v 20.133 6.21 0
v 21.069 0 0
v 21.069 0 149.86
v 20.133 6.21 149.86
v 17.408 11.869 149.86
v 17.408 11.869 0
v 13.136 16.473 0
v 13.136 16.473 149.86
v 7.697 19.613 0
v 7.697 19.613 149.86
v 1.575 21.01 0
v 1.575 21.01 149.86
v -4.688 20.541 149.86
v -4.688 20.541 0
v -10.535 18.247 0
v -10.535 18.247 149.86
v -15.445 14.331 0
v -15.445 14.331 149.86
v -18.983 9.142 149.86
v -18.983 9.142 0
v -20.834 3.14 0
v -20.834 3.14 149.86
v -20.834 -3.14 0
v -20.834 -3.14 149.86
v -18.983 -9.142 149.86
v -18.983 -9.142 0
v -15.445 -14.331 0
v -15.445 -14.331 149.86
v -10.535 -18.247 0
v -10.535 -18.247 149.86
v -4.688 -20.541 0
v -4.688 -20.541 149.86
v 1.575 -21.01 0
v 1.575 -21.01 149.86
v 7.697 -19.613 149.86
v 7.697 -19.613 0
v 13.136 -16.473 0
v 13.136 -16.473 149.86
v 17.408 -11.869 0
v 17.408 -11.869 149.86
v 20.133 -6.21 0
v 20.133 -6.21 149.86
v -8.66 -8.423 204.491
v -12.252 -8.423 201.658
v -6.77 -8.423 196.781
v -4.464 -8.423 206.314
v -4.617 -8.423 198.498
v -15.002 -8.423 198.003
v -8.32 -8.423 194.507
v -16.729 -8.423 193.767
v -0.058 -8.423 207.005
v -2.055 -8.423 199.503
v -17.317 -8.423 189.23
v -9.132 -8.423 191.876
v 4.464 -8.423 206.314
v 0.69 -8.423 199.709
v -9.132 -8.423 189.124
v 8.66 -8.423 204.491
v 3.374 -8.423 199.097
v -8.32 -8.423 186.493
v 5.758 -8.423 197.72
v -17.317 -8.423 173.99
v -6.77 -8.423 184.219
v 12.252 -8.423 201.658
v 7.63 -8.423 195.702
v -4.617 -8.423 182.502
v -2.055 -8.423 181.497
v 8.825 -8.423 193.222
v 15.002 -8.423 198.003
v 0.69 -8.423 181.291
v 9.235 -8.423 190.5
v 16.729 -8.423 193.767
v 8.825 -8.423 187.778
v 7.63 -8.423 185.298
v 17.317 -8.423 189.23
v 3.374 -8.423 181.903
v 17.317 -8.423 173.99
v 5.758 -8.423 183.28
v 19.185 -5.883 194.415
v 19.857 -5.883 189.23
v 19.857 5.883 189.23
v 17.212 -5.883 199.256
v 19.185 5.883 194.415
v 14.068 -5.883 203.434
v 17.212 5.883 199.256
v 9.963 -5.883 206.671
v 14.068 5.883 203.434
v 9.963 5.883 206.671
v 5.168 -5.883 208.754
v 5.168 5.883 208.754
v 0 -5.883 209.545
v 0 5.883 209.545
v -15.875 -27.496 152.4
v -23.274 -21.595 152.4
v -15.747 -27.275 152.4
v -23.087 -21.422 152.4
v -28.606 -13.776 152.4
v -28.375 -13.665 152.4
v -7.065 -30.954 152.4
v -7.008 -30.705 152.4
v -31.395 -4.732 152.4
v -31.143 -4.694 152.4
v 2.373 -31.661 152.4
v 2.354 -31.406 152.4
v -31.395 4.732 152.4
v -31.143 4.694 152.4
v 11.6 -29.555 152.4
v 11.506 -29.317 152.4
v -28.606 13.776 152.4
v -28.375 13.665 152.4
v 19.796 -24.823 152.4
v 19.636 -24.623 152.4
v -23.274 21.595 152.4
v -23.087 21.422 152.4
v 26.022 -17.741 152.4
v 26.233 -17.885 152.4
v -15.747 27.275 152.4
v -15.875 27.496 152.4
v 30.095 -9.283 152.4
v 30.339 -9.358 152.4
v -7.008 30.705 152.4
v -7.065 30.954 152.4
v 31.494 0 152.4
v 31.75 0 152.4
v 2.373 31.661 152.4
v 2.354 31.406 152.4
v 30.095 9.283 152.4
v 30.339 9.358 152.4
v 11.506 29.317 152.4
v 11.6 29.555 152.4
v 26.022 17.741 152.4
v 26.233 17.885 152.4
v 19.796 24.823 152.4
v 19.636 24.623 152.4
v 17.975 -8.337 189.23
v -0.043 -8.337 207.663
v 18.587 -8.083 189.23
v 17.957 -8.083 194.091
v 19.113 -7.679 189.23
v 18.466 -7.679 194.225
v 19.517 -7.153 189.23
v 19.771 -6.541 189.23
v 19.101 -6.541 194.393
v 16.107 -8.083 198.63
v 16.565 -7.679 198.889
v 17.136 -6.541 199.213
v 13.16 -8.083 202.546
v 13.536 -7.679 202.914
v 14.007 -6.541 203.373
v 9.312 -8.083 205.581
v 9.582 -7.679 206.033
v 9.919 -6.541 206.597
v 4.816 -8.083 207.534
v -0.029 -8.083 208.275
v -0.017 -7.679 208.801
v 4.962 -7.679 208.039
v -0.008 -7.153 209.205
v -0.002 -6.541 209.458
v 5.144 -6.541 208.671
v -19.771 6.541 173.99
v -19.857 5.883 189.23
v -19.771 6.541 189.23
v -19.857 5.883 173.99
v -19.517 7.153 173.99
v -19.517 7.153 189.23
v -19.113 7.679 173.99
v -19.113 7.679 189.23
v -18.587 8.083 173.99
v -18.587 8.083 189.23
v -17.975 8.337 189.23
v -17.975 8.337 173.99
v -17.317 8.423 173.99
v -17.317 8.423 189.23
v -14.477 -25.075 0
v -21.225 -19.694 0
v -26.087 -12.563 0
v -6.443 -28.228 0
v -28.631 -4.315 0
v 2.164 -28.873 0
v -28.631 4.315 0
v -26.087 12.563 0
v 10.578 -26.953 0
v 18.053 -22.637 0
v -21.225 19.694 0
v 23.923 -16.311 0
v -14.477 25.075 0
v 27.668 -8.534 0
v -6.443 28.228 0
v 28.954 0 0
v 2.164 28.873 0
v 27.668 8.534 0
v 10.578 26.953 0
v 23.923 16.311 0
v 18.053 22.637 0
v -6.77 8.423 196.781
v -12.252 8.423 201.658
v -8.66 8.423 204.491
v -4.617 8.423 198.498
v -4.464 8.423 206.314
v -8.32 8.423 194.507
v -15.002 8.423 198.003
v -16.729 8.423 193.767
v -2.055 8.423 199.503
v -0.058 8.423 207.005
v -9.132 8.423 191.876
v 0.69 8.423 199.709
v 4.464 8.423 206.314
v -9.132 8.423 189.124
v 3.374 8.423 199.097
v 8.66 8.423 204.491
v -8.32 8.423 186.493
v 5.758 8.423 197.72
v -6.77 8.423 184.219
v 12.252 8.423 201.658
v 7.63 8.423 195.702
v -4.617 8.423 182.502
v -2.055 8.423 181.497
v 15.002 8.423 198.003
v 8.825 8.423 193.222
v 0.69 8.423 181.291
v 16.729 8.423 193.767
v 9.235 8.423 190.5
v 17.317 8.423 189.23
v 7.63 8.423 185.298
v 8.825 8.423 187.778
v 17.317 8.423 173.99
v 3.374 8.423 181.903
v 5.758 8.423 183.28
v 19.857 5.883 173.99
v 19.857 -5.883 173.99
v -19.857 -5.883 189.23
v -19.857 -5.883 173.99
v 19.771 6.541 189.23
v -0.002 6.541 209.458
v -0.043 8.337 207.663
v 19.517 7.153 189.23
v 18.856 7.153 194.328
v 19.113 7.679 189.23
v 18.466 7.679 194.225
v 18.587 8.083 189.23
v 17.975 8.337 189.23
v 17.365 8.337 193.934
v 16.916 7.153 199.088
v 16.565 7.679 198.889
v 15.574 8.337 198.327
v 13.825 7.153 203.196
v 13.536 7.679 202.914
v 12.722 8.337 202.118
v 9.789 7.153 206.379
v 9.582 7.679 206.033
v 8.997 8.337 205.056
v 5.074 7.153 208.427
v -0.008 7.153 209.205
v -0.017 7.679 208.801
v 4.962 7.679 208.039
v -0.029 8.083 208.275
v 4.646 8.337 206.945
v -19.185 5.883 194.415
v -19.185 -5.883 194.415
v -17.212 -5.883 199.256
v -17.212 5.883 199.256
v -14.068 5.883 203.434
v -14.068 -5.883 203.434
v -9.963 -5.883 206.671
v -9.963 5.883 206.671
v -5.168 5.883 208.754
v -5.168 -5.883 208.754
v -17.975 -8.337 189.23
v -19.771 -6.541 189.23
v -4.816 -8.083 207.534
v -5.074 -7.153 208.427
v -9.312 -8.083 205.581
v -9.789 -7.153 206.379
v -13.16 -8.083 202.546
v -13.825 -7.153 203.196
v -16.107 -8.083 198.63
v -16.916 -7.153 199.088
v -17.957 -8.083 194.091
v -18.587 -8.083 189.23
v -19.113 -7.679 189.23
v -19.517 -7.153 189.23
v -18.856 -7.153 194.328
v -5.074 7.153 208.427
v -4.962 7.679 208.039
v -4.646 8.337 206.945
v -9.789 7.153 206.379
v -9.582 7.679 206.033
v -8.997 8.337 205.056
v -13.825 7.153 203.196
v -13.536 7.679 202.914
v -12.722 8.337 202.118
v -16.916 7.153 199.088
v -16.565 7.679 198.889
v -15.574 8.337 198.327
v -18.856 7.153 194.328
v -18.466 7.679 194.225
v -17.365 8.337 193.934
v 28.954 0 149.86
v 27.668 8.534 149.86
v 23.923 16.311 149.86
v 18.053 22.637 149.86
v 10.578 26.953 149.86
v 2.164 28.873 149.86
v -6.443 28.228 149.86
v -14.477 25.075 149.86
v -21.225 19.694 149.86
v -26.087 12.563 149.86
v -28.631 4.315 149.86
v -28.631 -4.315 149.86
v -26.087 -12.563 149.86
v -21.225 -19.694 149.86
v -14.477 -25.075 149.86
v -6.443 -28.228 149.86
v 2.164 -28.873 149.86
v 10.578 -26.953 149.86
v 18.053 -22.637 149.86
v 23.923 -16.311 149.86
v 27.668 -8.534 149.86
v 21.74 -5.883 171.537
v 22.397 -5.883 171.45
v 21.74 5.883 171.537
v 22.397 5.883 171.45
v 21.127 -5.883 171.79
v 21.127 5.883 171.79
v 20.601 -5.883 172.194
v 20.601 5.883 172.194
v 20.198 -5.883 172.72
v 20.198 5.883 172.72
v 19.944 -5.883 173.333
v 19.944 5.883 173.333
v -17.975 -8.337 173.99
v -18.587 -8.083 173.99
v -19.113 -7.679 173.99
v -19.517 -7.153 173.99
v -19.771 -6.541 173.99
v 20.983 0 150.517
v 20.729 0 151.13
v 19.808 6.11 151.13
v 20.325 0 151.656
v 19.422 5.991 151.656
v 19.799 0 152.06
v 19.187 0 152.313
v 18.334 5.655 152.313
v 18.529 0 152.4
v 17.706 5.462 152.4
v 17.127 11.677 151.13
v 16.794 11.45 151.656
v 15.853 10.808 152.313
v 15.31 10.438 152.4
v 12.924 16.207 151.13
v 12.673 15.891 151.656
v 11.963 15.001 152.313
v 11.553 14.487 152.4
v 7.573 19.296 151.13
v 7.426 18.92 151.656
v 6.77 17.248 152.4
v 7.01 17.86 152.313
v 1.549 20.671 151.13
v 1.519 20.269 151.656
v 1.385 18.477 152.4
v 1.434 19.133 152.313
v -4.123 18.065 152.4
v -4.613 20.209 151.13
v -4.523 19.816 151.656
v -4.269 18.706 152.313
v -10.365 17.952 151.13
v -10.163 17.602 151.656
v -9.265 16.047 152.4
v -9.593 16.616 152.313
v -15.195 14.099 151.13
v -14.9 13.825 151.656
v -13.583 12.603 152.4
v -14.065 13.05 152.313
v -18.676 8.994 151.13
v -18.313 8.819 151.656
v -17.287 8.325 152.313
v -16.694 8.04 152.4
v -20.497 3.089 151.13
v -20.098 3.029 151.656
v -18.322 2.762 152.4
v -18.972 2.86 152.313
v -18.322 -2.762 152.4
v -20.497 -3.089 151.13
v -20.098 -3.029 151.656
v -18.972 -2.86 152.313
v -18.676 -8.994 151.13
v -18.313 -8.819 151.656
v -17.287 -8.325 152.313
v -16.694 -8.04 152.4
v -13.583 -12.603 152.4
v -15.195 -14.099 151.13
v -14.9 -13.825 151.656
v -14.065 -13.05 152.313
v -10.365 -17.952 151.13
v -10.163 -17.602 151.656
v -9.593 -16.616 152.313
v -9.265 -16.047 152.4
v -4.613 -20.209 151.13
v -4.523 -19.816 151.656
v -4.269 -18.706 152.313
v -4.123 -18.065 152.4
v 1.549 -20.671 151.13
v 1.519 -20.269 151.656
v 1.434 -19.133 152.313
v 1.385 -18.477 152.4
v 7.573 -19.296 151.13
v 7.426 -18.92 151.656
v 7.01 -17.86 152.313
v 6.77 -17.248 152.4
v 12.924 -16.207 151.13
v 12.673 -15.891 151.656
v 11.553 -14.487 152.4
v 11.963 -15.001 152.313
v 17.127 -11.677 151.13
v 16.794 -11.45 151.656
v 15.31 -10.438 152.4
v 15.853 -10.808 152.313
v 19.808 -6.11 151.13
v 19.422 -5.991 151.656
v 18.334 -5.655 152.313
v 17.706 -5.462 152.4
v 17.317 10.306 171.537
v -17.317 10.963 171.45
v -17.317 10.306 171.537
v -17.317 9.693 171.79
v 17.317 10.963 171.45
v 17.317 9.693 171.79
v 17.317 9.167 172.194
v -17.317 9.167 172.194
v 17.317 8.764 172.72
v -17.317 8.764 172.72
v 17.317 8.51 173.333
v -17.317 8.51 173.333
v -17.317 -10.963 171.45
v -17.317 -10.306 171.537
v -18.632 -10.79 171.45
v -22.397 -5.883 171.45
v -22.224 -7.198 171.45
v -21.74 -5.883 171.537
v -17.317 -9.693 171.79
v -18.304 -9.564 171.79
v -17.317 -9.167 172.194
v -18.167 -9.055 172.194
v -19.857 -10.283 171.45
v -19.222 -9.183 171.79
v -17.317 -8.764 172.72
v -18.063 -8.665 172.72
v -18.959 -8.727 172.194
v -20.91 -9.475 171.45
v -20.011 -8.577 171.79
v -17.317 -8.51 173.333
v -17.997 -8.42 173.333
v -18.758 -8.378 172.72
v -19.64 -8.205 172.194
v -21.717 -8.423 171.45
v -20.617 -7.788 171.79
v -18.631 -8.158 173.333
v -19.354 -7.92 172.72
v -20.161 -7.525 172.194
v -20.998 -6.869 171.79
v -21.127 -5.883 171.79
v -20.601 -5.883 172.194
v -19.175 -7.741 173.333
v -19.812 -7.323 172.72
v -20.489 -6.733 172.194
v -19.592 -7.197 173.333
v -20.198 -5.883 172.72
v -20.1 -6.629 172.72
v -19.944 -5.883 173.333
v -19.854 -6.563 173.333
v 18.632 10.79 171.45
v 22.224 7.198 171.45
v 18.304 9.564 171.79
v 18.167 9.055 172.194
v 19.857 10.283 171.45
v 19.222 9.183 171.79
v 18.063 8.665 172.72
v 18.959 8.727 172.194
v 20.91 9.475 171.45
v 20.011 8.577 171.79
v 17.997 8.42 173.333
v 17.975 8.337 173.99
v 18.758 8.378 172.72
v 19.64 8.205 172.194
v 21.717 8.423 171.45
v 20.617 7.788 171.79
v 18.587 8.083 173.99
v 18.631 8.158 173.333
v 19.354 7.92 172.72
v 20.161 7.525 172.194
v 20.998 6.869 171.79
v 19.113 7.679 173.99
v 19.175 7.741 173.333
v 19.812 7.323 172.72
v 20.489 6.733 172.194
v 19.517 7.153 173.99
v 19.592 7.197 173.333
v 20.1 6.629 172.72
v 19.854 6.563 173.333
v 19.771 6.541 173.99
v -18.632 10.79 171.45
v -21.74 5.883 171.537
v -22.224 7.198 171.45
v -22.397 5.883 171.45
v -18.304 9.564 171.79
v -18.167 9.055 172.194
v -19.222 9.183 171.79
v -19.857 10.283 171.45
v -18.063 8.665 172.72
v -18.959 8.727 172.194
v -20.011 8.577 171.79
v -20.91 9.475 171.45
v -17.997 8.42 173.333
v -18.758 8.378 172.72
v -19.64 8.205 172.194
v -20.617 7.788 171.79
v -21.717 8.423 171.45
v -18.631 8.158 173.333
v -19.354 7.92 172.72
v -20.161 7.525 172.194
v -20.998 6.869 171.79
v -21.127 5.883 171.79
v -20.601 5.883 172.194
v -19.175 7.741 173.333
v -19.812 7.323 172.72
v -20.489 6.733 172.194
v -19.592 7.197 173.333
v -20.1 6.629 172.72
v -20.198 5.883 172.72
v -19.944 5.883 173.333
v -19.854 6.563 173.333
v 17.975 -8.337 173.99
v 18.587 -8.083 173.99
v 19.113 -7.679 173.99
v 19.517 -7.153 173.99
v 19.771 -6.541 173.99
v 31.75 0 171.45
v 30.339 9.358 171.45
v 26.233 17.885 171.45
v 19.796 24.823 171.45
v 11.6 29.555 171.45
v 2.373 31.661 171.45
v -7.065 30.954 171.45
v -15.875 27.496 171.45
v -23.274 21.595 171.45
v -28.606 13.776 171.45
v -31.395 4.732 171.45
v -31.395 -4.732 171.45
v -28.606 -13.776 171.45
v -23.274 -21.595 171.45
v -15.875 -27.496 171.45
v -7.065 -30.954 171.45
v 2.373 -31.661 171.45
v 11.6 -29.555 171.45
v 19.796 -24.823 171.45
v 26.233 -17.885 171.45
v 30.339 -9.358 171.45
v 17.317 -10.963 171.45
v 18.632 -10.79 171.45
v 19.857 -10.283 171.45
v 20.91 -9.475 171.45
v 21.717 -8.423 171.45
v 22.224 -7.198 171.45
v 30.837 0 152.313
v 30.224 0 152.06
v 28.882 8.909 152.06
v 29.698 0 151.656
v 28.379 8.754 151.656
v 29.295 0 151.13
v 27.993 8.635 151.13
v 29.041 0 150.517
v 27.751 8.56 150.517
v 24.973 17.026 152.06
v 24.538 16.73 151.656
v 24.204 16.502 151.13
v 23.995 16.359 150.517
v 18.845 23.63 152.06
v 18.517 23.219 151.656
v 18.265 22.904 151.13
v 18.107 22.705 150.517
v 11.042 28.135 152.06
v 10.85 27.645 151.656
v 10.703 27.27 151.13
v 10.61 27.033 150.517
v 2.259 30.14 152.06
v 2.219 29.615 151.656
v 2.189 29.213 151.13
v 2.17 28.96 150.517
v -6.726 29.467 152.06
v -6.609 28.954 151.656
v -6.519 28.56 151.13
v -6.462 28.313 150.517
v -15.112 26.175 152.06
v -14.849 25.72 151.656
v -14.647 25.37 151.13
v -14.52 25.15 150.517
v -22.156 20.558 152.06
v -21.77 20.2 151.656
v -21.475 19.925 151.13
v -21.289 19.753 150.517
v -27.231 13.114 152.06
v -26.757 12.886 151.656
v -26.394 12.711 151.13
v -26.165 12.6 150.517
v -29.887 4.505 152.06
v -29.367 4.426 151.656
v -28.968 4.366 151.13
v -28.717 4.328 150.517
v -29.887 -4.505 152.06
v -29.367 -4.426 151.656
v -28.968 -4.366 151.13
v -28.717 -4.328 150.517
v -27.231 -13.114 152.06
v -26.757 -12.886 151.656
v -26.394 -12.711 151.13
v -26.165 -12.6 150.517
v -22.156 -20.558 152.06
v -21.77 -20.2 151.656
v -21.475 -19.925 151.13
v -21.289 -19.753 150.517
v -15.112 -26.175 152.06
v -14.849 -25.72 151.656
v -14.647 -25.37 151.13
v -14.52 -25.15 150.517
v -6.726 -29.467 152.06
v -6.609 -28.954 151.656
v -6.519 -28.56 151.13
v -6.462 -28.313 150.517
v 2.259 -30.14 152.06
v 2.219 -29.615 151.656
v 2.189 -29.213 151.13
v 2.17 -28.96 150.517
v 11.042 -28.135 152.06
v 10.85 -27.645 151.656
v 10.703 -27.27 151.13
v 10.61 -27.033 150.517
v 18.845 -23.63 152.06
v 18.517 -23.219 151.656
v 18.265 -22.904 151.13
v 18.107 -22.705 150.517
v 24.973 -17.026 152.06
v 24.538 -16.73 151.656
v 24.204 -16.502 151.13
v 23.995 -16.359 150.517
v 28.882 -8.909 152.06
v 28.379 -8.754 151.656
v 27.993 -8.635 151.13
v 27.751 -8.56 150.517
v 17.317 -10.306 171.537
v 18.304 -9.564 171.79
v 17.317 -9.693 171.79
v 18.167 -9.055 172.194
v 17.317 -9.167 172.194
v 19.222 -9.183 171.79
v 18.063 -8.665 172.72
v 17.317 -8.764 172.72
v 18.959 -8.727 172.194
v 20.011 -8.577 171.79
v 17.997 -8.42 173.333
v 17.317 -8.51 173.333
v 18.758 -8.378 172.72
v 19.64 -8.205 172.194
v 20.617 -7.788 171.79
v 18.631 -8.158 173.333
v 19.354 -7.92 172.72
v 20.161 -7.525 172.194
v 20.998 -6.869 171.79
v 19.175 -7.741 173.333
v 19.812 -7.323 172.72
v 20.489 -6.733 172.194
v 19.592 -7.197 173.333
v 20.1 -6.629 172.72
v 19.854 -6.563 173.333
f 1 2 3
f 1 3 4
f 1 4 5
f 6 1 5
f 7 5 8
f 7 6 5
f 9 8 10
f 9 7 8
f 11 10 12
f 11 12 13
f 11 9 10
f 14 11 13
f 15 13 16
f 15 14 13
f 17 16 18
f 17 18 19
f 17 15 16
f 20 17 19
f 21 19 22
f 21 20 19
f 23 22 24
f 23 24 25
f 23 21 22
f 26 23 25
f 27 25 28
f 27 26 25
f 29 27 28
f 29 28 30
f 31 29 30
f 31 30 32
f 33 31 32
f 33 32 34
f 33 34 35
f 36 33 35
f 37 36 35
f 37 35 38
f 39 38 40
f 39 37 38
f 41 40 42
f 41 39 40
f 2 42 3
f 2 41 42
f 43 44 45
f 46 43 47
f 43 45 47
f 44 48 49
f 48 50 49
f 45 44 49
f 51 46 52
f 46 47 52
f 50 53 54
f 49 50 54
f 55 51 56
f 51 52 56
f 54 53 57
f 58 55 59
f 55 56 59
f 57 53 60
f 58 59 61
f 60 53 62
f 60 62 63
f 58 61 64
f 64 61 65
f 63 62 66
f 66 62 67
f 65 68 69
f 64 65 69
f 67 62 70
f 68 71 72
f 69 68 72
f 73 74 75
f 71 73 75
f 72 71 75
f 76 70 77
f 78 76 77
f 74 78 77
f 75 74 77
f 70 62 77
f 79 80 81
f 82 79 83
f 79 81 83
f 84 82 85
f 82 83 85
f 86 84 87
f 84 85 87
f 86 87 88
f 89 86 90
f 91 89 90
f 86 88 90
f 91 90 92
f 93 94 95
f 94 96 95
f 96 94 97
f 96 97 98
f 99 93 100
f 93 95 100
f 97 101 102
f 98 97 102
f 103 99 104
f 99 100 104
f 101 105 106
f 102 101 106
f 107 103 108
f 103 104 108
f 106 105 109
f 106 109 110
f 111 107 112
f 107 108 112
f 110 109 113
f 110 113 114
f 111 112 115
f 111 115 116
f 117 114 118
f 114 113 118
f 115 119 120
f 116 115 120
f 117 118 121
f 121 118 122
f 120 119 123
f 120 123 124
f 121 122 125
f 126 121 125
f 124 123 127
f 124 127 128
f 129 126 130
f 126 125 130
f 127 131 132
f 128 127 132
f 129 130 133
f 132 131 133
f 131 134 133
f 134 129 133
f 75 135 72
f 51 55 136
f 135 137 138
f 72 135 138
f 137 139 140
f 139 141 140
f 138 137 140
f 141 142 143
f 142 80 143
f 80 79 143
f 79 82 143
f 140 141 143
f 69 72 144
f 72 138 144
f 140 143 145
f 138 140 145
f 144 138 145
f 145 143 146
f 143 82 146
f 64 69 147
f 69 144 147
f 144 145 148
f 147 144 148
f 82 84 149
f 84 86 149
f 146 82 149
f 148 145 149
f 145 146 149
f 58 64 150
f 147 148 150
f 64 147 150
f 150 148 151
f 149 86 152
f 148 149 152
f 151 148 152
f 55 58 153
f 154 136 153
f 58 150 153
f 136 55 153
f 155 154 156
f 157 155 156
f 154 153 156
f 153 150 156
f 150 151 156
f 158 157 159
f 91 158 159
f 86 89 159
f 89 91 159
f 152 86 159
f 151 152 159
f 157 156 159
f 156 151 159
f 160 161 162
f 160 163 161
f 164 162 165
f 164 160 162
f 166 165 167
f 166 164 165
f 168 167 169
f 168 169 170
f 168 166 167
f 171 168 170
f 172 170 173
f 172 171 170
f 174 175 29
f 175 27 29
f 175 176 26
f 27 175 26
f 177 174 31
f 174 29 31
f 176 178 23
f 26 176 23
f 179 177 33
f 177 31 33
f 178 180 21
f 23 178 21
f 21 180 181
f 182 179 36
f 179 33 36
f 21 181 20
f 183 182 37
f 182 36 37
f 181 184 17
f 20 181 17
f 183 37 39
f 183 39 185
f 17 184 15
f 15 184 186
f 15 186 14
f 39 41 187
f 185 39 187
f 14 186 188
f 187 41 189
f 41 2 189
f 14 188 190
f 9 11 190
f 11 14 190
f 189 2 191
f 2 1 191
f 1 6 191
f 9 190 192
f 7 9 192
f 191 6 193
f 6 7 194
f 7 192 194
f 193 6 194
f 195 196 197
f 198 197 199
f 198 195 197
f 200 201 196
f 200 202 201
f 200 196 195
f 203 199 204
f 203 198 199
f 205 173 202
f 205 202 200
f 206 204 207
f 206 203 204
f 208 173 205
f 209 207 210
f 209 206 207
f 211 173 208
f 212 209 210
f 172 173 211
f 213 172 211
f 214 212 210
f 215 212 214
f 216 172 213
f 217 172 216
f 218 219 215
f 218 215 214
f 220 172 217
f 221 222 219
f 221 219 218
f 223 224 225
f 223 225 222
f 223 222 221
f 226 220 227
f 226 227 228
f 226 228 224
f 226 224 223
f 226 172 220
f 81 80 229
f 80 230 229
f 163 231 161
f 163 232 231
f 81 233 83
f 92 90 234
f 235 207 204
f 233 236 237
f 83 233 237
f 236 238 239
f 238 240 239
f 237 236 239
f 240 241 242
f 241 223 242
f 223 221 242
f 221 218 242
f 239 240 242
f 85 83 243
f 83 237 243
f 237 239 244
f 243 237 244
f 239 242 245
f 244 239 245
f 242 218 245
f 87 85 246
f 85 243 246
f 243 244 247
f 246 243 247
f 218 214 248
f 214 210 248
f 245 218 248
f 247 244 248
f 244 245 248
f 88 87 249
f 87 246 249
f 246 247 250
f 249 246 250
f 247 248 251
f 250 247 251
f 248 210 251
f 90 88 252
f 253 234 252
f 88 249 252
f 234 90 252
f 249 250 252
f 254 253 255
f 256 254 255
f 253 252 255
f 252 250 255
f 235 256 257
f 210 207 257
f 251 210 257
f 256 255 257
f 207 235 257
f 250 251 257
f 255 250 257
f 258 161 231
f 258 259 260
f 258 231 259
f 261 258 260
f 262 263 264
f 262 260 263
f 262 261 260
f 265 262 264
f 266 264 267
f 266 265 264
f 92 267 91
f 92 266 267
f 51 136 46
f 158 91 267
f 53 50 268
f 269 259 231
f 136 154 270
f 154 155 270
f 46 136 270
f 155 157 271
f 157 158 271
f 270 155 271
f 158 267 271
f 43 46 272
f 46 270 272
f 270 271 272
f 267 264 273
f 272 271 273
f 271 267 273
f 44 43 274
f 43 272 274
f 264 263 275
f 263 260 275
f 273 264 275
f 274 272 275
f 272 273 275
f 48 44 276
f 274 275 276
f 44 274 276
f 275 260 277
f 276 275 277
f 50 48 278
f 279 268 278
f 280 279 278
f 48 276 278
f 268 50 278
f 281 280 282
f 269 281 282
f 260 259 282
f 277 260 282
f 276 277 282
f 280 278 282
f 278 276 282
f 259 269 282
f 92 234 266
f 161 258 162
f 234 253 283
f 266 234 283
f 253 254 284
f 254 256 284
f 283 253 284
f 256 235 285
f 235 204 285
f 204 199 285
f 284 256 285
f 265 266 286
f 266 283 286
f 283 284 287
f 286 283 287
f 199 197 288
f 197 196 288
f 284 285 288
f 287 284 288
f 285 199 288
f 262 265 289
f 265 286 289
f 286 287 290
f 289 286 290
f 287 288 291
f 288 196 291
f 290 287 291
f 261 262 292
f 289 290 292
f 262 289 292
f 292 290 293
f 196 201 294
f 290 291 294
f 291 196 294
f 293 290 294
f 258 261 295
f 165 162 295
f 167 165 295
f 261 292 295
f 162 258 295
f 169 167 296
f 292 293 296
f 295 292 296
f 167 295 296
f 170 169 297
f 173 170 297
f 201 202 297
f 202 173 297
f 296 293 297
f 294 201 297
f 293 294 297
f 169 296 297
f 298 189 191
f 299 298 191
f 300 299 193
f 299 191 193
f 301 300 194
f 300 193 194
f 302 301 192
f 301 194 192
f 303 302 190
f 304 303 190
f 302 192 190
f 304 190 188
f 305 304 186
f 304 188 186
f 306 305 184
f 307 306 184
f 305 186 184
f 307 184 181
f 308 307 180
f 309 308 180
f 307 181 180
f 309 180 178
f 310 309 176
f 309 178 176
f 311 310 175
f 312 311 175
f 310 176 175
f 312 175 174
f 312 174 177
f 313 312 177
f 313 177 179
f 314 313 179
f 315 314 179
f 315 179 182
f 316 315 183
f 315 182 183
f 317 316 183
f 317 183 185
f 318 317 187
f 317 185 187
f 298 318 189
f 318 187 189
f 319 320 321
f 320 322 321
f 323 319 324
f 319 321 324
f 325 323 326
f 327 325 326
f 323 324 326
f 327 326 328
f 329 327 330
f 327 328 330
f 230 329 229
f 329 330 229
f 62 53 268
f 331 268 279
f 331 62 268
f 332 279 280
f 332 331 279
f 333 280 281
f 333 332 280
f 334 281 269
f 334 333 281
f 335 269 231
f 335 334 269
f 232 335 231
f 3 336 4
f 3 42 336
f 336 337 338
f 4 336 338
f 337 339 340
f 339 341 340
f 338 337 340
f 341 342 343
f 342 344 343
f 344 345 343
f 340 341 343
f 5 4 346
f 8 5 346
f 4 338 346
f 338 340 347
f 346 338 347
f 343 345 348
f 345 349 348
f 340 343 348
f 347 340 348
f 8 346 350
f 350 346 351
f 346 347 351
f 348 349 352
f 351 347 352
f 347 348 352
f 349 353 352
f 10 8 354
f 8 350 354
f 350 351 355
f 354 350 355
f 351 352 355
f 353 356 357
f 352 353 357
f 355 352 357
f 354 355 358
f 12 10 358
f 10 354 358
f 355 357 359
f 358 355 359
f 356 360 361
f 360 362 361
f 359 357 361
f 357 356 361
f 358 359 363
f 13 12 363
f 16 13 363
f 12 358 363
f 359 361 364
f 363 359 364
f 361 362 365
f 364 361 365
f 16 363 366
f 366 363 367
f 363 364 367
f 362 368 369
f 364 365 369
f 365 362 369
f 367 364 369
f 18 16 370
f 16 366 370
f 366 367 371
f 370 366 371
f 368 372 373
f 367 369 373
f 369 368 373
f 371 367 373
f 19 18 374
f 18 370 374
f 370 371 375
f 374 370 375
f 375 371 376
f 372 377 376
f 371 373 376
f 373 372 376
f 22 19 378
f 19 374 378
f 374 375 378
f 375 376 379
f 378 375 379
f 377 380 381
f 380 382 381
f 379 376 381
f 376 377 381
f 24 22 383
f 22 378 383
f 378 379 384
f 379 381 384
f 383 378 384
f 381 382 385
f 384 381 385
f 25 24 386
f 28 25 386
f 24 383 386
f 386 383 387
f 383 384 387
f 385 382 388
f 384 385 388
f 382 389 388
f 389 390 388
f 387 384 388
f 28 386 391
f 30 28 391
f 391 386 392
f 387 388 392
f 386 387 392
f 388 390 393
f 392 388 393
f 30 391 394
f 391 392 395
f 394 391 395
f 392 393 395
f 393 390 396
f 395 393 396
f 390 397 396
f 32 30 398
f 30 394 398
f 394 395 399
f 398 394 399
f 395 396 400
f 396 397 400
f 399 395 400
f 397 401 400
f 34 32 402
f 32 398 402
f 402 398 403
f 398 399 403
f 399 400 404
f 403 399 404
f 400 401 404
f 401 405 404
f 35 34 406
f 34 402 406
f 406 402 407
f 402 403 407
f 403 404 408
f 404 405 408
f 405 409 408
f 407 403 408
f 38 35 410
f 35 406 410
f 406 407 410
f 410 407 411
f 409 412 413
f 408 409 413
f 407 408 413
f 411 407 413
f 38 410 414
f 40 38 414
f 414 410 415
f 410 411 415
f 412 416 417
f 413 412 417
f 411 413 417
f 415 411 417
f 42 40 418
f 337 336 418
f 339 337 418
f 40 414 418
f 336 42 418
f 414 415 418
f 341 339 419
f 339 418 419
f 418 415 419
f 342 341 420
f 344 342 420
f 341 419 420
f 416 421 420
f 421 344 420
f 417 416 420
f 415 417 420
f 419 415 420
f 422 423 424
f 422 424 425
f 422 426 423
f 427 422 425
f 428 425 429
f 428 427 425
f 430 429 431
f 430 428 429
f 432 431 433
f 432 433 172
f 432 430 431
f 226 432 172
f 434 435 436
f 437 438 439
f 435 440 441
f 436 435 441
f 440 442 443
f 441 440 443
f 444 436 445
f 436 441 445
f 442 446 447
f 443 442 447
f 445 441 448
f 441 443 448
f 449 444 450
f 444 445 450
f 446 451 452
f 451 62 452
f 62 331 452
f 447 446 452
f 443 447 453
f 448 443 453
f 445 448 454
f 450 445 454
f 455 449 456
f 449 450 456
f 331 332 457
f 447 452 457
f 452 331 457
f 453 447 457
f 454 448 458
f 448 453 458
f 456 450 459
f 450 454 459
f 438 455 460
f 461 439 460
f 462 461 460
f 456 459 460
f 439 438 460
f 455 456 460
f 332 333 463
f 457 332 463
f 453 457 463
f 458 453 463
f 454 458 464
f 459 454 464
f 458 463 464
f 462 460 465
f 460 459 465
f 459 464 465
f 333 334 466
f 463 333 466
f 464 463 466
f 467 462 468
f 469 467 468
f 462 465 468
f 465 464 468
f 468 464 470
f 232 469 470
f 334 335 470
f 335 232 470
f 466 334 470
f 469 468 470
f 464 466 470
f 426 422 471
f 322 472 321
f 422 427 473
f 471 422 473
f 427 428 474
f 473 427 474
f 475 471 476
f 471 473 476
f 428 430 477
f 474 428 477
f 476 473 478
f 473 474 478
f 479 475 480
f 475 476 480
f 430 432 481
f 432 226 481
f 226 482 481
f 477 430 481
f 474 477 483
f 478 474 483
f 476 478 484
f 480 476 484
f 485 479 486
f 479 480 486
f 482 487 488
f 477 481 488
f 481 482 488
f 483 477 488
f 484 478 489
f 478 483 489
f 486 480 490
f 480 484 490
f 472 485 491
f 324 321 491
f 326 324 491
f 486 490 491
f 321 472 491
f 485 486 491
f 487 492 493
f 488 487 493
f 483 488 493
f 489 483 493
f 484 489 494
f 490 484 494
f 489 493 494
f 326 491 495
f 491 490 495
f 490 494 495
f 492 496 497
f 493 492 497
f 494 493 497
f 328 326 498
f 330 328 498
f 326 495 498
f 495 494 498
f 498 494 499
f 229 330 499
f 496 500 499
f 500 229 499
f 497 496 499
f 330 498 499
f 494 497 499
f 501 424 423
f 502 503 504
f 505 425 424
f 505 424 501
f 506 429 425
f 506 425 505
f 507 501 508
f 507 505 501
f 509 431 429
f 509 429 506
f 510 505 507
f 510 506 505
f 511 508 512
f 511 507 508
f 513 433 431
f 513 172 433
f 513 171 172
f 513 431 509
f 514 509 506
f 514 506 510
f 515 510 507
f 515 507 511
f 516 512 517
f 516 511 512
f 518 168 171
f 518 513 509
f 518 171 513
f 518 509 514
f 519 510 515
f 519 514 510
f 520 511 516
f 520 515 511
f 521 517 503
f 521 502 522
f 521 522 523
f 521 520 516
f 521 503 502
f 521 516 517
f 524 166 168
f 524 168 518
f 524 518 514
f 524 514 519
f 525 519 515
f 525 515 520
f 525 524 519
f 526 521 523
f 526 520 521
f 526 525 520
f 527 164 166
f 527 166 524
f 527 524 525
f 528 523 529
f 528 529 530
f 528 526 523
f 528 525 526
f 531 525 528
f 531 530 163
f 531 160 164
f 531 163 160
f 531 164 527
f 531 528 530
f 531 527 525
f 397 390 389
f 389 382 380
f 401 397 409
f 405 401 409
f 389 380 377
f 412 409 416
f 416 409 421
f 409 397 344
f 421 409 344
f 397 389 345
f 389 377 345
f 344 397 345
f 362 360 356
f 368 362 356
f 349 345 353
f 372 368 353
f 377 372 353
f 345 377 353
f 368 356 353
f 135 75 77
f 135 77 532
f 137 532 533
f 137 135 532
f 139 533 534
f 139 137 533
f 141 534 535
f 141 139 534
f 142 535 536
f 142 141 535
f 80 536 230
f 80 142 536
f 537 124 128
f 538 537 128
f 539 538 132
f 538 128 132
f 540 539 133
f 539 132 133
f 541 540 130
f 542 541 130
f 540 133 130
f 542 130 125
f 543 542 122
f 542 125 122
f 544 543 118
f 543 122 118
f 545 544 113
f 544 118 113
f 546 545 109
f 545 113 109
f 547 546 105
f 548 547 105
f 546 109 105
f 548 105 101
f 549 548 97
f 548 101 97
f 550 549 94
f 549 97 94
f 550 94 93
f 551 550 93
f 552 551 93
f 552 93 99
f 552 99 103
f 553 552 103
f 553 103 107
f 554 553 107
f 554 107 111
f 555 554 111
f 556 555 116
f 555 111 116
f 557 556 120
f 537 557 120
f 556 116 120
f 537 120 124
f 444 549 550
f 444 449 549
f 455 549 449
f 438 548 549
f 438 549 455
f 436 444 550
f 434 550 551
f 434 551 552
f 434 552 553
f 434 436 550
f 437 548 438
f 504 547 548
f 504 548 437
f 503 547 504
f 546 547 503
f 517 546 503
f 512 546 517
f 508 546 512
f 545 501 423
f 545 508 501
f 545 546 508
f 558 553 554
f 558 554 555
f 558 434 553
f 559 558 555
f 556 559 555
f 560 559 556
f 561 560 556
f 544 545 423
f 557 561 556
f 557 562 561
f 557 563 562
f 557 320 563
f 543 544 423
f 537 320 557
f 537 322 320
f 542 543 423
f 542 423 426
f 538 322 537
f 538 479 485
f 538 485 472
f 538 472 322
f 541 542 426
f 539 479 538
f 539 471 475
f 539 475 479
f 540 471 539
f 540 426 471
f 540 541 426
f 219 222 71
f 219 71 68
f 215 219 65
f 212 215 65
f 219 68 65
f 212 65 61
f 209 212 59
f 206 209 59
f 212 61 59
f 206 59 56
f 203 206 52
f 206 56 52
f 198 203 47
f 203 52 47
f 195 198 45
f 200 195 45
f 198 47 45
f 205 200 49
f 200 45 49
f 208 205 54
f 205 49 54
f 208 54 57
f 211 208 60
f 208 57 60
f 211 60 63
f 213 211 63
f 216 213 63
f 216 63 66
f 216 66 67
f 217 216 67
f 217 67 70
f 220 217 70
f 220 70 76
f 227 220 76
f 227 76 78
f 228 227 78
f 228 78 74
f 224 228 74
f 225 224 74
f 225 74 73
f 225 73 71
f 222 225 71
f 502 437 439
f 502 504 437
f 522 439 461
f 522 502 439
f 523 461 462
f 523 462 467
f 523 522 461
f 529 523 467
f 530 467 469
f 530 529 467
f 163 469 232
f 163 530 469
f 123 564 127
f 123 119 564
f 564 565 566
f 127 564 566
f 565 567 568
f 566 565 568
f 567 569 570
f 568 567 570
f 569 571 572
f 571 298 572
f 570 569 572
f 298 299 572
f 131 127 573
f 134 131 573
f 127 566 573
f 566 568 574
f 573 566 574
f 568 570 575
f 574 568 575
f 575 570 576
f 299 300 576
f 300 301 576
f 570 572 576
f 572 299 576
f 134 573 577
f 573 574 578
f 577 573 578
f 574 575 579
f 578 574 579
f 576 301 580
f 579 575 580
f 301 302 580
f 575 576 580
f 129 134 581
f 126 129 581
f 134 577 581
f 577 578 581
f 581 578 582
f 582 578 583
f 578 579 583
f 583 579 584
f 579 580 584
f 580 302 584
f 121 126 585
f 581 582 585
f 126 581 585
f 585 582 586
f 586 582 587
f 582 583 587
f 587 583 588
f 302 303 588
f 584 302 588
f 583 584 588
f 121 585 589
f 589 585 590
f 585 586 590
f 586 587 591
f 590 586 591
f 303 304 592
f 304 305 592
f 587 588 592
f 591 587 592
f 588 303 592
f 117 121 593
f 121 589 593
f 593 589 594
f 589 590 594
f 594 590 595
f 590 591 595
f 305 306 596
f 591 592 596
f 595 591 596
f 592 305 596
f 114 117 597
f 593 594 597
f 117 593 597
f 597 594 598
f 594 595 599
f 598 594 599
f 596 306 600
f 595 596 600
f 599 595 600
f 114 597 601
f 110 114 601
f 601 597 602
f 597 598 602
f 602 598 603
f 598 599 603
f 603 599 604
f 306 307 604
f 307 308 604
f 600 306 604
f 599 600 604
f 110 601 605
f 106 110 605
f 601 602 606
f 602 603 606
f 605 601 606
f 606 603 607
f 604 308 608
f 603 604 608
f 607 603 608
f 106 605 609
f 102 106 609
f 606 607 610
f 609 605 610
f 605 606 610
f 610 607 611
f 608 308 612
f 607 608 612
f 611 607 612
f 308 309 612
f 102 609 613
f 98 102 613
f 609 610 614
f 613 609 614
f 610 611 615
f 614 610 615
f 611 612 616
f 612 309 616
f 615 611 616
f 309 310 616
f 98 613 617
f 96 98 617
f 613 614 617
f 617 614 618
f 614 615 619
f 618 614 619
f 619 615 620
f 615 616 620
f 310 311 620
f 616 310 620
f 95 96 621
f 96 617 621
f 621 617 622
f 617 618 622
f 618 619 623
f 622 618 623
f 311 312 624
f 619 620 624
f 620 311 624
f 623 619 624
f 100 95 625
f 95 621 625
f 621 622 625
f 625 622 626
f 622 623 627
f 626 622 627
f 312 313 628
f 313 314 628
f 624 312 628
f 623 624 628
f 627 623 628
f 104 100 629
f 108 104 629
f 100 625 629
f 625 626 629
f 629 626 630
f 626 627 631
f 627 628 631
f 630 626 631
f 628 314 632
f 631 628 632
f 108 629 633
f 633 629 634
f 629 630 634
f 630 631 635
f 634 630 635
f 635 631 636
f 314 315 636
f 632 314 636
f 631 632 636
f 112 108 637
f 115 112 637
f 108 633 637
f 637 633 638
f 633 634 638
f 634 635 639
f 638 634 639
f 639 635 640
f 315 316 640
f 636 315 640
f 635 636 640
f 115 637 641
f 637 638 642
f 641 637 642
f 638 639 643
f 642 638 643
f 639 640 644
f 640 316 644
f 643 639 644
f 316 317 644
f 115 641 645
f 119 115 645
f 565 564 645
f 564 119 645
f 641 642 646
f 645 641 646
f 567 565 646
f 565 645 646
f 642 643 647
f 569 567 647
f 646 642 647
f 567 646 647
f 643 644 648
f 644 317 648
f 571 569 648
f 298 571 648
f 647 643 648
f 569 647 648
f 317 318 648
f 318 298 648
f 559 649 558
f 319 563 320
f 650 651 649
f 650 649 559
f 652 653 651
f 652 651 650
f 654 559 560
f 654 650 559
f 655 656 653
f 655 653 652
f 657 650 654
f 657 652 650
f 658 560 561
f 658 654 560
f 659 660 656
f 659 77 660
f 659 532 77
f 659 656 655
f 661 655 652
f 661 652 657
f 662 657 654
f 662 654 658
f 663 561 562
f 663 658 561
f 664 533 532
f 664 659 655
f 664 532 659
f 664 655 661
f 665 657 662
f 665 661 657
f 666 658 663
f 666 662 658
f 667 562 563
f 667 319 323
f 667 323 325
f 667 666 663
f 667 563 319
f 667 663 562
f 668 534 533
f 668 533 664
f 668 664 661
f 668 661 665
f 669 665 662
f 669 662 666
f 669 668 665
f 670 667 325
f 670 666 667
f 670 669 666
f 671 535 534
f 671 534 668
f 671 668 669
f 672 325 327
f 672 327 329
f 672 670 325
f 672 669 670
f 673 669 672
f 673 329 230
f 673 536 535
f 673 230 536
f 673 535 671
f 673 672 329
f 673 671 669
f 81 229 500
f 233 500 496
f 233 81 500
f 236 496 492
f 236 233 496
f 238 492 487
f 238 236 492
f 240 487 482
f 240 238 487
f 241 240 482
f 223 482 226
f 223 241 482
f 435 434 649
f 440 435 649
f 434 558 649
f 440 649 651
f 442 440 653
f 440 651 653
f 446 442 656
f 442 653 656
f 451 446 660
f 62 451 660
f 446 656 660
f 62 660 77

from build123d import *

# Parameters (mm, degrees)
F0_R        = 28.9544209137
F0_R_2      = 21.0693
F1_DEPTH    = 152.4
F2_R        = 31.75
F3_DEPTH    = 19.05
F4_W        = 39.7148355842
F4_H        = 16.8466605246
F5_DEPTH    = 38.1
F6_R        = 9.2348971927
F7_DEPTH    = 25.4
F8_T1_DEPTH = 118.4466605246
F9_R        = 2.54


# Not quite as in the source:
# - a fillet or chamfer that OpenCascade refuses, or shapes differently, is made with other operations: its cross-section is extruded or revolved along the edge and cut away or added


with BuildPart() as f1:
    # F0 (on Top) → F1 (new body)
    with BuildSketch(Plane.XY):
        Circle(F0_R)
        Circle(F0_R_2, mode=Mode.SUBTRACT)
    extrude(amount=F1_DEPTH)

    # F2 (on face) → F3 (join)
    with BuildSketch(Plane.XY.offset(152.4)):
        Circle(F2_R)
    extrude(amount=F3_DEPTH)

    # F4 (on face) → F5 (join)
    with BuildSketch(Plane.XY.offset(171.45)):
        Rectangle(F4_W, F4_H)
    extrude(amount=F5_DEPTH)

    # F6 (on face) → F7 (cut)
    with BuildSketch(Plane.XZ.offset(8.4233302623)):
        with Locations((0, 190.5)):
            Circle(F6_R)
    extrude(amount=-F7_DEPTH, mode=Mode.SUBTRACT)

    # F8: fillet of radius 20.32 on 2 edges, made by hand

    # F8_s2 → F8_t1 (cut)
    with BuildSketch(Plane.XZ.offset(-59.2233302623)):
        with BuildLine():
            ThreePointArc((19.8574177921, 189.23), (13.9058275858, 203.5984097937), (-0.4625822079, 209.55))
            Line((-0.4625822079, 209.55), (19.8574177921, 209.55))
            Line((19.8574177921, 209.55), (19.8574177921, 189.23))
        make_face()
        with BuildLine():
            ThreePointArc((-19.8574177921, 189.23), (-13.9058275858, 203.5984097937), (0.4625822079, 209.55))
            Line((0.4625822079, 209.55), (-19.8574177921, 209.55))
            Line((-19.8574177921, 209.55), (-19.8574177921, 189.23))
        make_face()
    extrude(amount=F8_T1_DEPTH, mode=Mode.SUBTRACT)

    # F9
    f9_edges = [f1.edges().sort_by_distance(p)[0] for p in [
        (19.857418, -8.42333, 180.34),
        (14.068455, -8.42333, 203.433921),
        (-14.068455, -8.42333, 203.433921),
        (-19.857418, -8.42333, 180.34),
        (0, -8.42333, 171.45),
        (19.857418, 0, 171.45),
        (-28.954421, 0, 152.4),
        (-21.0693, 0, 152.4),
        (19.857418, 8.42333, 180.34),
        (14.068455, 8.42333, 203.433921),
        (-14.068455, 8.42333, 203.433921),
        (0, 8.42333, 171.45),
        (-19.857418, 0, 171.45),
        (-19.857418, 8.42333, 180.34),
    ]]
    fillet(f9_edges, radius=F9_R)


solid = f1.part
